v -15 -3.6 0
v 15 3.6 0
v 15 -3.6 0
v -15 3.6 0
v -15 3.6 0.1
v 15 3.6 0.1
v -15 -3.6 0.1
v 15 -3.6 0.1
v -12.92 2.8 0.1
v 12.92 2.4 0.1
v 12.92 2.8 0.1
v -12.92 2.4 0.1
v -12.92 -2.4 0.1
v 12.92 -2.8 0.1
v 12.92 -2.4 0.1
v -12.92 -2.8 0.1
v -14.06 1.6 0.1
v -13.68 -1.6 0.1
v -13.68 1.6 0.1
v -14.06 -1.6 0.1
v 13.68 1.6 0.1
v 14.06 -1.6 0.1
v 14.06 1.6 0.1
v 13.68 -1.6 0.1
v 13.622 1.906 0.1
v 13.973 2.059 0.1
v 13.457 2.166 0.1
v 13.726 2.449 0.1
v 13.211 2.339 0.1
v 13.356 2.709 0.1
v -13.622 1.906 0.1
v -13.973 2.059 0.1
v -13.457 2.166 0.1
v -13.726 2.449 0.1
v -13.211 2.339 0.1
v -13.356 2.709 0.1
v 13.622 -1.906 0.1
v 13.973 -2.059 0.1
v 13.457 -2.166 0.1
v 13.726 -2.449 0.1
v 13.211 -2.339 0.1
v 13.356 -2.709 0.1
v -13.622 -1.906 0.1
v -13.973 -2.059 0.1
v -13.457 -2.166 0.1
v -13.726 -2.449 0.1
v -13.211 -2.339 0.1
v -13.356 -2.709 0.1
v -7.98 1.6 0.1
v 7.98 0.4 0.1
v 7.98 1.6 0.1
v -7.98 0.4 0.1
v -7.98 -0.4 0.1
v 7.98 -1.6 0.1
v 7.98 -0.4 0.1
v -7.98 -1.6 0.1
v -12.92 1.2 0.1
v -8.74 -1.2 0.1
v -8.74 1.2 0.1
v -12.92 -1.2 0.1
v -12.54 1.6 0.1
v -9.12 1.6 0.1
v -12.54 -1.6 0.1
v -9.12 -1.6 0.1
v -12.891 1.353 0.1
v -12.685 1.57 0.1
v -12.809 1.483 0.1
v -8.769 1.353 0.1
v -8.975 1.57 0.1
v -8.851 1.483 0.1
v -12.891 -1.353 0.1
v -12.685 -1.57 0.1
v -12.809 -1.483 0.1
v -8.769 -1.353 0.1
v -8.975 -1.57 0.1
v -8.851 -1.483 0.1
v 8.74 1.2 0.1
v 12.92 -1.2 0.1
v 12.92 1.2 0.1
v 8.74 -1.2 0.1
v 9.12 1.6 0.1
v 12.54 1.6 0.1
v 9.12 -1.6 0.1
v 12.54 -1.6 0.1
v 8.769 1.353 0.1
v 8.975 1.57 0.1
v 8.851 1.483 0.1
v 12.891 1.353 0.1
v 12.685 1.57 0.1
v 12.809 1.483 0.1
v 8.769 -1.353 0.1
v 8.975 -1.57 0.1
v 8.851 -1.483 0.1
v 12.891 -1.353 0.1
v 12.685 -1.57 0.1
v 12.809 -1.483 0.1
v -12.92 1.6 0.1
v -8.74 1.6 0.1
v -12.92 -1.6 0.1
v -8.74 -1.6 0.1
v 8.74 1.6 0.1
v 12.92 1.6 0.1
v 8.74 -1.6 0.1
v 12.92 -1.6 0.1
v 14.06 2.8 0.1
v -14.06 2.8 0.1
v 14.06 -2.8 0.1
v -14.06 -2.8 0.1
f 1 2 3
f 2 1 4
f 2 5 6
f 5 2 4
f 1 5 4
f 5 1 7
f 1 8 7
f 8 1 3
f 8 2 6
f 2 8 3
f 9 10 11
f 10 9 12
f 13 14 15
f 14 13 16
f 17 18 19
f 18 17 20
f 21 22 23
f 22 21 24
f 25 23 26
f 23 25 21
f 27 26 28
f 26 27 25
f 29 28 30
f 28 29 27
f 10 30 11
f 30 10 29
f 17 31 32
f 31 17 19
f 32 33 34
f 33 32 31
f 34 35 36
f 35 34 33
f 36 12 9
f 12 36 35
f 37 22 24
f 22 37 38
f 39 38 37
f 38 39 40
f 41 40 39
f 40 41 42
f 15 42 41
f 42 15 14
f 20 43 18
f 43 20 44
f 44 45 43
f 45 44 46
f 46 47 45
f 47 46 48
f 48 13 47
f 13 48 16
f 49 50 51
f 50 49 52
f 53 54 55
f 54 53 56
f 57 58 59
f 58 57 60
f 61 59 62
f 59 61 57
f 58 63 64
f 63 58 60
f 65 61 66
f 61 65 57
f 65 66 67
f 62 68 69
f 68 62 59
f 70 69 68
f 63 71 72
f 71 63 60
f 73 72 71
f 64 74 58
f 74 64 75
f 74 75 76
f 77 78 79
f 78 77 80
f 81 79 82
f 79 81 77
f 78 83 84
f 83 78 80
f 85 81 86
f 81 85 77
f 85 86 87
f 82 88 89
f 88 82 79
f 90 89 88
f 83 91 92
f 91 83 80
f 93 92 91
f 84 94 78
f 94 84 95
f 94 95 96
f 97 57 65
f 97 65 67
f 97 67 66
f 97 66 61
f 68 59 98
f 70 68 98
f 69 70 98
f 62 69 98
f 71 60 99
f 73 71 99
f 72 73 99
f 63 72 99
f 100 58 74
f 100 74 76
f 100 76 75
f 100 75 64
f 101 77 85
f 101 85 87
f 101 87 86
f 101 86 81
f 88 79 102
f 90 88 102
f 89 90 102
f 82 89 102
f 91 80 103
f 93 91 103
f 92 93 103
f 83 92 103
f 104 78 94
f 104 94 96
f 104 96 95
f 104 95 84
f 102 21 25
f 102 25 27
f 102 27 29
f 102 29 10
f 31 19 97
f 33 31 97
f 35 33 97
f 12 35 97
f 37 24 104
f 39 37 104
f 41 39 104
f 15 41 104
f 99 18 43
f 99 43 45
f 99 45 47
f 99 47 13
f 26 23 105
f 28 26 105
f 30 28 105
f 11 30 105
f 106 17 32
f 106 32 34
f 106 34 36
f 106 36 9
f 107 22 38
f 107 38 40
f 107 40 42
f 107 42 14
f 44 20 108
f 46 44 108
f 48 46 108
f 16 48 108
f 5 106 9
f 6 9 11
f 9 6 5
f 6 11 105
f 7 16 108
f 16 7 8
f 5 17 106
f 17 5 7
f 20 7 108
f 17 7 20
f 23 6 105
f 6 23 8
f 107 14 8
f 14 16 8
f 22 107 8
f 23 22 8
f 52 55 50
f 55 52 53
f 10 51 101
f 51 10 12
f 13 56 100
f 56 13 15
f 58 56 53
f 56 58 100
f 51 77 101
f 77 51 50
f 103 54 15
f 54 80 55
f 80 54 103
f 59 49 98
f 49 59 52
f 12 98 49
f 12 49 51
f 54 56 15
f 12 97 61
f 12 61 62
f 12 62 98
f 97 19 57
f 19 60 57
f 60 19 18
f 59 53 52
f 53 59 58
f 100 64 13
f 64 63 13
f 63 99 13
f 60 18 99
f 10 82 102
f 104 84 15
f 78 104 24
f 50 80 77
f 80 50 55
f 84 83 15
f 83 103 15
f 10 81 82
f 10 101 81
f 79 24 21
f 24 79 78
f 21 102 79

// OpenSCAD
use <../lib.scad>
use <../p/box5-12.scad>
use <s/190435cs01.scad>
use <s/3010a20.scad>
$fa=1; $fs=0.2;
function ldraw_lib__190435c(realsolid=false) = [
// 0 Sticker  0.9 x  3.7 with Black Car Front on Yellow Background
// 0 Name: 190435c.dat
// 0 Author: J.C. Tchang [tchang]
// 0 !LDRAW_ORG Part UPDATE 2013-02
// 0 !LICENSE Licensed under CC BY 2.0 and CC BY 4.0 : see CAreadme.txt
// 
// 0 BFC CERTIFY CCW
  [0,"BFC","CERTIFY"],
  [0,"BFC","CCW"],
// 
// 0 !KEYWORDS set 646
// 
// 0 !HISTORY 2013-12-23 [PTadmin] Official Update 2013-02
// 
// 
// 1 16 0 -0.25 0 37.5 0 0 0 0.25 0 0 0 9 box5-12.dat
  [1,16,0,-0.25,0,37.5,0,0,0,0.25,0,0,0,9, ldraw_lib__box5_12(realsolid)],
// 1 0 0 9.75 12 0.95 0 0 0 0 1 0 -1 0 s\3010a20.dat
  [1,0,0,9.75,12,0.95,0,0,0,0,1,0,-1,0, ldraw_lib__s__3010a20(realsolid)],
// 1 14 0 9.75 12 1 0 0 0 0 1 0 -1 0 s\190435cs01.dat
  [1,14,0,9.75,12,1,0,0,0,0,1,0,-1,0, ldraw_lib__s__190435cs01(realsolid)],
];
module ldraw_lib__190435c(step=0, col=false, unit=2/5, alt=false, line=0.2, solid=!$preview)
    makepoly(ldraw_lib__190435c(solid), step=step, col=col, unit=unit, alt=alt, line=line, solid=solid);
ldraw_lib__190435c(line=0.2);
